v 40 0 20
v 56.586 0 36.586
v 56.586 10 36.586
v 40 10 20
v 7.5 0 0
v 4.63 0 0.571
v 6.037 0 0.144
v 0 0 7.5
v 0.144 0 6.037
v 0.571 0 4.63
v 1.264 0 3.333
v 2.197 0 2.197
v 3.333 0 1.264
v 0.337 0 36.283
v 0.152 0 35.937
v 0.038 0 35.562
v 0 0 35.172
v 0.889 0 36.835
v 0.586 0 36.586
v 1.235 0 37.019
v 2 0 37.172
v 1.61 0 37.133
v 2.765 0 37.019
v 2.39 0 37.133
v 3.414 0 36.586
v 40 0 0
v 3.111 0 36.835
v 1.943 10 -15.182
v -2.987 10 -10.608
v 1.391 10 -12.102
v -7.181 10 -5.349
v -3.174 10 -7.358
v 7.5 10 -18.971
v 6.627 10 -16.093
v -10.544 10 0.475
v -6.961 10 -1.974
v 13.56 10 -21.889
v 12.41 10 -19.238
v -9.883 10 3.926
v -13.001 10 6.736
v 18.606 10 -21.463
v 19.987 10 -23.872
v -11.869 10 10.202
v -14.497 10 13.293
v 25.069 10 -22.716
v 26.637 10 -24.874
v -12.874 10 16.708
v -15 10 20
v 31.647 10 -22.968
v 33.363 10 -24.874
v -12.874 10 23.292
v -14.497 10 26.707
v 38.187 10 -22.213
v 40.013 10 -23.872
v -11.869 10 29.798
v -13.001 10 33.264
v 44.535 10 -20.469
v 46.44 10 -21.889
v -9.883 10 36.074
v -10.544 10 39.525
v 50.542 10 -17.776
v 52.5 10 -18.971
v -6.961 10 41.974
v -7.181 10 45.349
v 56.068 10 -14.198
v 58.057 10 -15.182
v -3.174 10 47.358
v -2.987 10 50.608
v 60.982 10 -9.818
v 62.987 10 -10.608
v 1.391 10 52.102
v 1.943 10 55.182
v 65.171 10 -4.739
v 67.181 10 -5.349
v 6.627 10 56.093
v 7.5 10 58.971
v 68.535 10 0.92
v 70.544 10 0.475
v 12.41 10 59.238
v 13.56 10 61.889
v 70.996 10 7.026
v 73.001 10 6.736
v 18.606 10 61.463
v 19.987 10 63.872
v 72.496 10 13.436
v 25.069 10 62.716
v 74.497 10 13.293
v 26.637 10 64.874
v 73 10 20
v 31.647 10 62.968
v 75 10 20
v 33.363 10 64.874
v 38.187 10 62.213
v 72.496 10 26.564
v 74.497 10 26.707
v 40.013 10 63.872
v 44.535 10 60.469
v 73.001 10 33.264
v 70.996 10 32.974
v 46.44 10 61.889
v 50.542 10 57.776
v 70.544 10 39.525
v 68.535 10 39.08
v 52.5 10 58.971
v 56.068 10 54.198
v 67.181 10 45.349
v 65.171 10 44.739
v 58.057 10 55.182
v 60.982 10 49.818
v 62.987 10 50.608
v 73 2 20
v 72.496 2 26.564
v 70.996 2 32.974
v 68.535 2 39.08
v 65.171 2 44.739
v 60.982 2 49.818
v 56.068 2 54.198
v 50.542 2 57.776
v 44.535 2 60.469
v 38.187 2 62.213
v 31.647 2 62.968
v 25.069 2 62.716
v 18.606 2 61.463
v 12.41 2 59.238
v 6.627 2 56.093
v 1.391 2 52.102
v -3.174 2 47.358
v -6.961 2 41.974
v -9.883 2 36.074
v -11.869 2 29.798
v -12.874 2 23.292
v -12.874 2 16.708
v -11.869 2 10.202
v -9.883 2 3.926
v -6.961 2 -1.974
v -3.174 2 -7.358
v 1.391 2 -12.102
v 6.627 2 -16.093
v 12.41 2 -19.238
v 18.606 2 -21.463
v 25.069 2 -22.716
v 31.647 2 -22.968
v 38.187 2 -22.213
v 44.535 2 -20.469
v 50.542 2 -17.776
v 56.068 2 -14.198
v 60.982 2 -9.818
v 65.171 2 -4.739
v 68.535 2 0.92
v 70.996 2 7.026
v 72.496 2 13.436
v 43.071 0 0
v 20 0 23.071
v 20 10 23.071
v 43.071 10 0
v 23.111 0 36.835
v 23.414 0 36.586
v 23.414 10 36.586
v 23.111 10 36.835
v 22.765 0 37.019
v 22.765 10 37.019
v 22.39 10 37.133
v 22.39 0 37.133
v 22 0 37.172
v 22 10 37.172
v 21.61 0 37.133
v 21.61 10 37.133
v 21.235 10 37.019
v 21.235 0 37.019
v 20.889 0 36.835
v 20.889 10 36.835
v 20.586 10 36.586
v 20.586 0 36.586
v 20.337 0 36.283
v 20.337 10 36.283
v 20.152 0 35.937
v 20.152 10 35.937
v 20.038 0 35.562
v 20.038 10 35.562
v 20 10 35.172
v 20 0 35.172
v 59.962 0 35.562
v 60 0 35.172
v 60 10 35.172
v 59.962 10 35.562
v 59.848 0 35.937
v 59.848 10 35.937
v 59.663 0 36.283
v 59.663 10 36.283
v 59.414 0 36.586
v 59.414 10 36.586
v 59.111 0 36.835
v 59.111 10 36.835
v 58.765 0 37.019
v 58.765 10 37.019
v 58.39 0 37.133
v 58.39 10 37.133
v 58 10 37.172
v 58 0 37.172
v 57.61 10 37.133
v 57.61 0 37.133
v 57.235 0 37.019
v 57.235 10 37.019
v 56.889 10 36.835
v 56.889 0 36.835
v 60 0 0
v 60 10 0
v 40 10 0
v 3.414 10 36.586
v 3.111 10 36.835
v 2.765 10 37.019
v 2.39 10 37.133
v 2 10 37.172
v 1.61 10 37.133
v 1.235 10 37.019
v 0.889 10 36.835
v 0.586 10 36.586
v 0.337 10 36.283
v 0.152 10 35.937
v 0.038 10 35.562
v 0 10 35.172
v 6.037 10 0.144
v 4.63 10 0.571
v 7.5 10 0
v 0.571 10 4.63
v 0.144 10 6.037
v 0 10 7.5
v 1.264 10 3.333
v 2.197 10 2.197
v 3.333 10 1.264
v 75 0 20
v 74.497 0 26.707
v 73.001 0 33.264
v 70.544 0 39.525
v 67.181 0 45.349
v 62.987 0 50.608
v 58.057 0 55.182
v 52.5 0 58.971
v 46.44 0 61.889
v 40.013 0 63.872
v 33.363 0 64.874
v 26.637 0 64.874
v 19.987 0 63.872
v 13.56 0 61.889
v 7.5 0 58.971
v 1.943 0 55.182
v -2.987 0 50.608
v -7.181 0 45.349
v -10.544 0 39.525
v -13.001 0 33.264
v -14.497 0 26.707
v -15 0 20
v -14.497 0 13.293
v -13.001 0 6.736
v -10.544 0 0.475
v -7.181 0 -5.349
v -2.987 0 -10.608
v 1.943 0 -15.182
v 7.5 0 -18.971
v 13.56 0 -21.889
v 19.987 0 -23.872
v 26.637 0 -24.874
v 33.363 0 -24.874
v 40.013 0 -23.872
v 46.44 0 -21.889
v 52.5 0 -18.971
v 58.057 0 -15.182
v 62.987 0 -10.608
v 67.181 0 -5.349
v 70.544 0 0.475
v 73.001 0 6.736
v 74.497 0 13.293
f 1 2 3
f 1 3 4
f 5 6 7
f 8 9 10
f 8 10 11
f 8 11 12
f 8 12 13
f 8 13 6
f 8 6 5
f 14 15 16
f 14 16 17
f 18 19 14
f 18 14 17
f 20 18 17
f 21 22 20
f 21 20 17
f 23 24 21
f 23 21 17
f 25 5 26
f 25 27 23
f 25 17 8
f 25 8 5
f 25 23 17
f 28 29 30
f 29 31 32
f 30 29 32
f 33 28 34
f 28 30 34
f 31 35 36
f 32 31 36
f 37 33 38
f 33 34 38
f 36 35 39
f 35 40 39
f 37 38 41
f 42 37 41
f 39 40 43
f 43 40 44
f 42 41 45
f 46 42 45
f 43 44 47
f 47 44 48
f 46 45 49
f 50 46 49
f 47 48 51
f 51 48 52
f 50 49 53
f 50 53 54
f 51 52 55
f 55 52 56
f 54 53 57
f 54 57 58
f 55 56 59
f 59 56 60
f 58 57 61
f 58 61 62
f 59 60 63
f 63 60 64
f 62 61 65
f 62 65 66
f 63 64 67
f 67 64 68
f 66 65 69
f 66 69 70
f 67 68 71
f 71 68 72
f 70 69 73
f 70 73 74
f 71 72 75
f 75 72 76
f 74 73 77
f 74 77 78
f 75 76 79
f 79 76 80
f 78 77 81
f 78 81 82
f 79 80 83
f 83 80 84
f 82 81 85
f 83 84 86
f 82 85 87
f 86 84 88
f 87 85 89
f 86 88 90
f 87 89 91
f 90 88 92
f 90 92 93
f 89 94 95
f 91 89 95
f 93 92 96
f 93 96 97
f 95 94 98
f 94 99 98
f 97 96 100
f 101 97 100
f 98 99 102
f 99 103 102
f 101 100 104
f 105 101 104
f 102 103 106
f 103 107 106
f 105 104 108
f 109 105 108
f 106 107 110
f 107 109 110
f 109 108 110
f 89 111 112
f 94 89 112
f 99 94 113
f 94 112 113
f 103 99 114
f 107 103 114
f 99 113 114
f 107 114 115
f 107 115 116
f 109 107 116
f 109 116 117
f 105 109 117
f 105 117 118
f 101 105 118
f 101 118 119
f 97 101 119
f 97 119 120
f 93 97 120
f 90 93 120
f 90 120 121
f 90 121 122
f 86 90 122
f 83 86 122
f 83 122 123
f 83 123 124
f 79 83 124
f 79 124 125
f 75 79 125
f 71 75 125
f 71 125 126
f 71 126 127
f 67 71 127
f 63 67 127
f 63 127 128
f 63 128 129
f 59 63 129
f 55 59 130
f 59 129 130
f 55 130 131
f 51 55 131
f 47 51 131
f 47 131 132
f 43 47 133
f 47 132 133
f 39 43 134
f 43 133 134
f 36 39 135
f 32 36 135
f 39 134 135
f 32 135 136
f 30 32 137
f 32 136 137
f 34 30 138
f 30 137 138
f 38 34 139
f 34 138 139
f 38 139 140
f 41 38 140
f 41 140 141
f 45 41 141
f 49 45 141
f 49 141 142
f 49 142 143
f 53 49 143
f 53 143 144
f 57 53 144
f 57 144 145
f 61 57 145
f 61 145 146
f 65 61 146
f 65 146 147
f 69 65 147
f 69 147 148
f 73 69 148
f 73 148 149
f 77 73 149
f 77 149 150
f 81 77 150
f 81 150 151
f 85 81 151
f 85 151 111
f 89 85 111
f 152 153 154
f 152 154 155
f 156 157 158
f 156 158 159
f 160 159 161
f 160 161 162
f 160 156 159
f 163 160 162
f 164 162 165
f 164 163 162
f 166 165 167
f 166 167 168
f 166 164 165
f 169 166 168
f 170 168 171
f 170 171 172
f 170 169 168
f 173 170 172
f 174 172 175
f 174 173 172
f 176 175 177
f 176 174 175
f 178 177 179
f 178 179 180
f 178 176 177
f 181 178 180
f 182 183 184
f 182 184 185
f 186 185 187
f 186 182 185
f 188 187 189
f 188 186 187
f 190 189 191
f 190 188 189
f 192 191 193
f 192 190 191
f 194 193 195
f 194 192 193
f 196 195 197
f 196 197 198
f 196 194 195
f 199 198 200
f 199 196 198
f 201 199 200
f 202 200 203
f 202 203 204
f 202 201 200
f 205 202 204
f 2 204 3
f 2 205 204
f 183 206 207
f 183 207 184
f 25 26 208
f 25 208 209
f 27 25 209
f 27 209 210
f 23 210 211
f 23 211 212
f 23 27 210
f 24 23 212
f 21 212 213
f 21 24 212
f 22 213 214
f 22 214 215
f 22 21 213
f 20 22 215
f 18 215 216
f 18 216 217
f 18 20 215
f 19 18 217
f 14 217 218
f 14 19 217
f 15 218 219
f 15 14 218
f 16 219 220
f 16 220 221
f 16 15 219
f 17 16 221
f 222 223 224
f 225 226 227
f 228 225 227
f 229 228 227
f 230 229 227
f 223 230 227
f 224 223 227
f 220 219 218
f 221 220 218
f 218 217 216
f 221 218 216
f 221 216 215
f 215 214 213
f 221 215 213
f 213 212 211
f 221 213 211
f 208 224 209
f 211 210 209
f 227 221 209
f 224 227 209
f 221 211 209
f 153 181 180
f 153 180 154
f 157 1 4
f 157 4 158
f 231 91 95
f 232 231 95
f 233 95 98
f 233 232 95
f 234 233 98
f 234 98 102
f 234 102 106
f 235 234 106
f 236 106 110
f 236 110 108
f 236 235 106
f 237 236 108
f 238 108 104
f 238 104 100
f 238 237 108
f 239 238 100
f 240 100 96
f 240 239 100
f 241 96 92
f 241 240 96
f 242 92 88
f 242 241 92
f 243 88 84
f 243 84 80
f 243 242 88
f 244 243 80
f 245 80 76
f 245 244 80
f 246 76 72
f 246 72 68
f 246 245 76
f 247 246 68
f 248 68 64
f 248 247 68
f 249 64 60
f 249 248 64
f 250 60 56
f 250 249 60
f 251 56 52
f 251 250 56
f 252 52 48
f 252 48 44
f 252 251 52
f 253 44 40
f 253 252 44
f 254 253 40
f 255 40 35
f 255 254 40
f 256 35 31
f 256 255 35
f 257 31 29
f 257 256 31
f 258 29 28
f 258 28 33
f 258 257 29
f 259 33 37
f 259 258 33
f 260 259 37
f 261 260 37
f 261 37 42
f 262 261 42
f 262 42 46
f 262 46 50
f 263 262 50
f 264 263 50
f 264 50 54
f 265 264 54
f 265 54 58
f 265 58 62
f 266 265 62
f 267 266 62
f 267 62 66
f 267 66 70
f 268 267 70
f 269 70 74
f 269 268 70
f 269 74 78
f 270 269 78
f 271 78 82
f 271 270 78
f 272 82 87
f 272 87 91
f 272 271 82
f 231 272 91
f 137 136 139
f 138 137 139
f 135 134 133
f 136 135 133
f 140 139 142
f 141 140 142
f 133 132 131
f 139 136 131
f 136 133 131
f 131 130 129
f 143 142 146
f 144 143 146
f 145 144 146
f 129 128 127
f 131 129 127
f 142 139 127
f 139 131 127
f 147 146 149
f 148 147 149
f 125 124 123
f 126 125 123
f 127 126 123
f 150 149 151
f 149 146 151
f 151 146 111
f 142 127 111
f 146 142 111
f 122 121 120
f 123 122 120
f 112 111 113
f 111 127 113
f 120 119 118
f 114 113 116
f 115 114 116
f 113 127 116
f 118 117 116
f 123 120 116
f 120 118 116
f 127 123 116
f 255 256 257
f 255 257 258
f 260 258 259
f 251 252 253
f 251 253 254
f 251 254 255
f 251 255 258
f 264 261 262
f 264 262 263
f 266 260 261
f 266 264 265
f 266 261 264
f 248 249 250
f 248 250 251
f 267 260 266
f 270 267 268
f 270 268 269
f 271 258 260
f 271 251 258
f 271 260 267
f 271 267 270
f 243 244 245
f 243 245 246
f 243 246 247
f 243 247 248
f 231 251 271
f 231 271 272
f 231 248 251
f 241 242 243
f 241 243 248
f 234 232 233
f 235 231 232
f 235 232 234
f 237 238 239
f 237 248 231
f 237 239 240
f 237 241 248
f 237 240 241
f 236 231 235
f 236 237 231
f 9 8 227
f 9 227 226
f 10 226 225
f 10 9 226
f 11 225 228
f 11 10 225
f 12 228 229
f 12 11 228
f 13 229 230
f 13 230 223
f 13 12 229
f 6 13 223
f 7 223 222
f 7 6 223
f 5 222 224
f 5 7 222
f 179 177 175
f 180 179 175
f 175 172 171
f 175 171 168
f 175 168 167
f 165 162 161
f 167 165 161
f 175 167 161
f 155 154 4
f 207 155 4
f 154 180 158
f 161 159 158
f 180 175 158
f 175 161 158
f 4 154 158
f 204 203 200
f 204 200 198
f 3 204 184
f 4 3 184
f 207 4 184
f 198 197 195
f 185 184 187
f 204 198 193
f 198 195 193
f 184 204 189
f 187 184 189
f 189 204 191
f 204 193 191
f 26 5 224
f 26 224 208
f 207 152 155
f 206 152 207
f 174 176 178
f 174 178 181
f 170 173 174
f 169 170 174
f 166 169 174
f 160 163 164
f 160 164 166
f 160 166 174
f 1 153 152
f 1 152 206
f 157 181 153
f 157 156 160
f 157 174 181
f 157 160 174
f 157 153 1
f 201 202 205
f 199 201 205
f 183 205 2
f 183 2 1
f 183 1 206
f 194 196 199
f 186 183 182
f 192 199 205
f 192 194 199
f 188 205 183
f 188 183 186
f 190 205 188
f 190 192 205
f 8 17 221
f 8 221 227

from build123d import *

# Parameters (mm, degrees)
F1_DEPTH = 10
F2_R     = 45
F3_DEPTH = 10
F4_T     = -2


with BuildPart() as f1:
    # F0 (on Front) → F1 (new body)
    with BuildSketch(Plane.XZ):
        with BuildLine():
            ThreePointArc((0, 7.5), (2.1966991411, 2.1966991411), (7.5, 0))
            Line((7.5, 0), (20, 0))
            Line((20, 0), (40, 0))
            Line((40, 0), (20, 20))
            Line((20, 20), (3.4142135624, 36.5857864376))
            ThreePointArc((3.4142135624, 36.5857864376), (1.2346331353, 37.0193319403), (0, 35.1715728753))
            Line((0, 35.1715728753), (0, 20))
            Line((0, 20), (0, 7.5))
        make_face()
    extrude(amount=-F1_DEPTH)


with BuildPart() as f1b:
    # F0 (on Front) → F1, piece 2 (new body)
    with BuildSketch(Plane.XZ):
        with BuildLine():
            Line((20, 35.1715728753), (20, 23.0705063045))
            Line((20, 23.0705063045), (43.0705063045, 0))
            Line((43.0705063045, 0), (60, 0))
            Line((60, 0), (60, 35.1715728753))
            ThreePointArc((60, 35.1715728753), (58.7653668647, 37.0193319403), (56.5857864376, 36.5857864376))
            Line((56.5857864376, 36.5857864376), (40, 20))
            Line((40, 20), (23.4142135624, 36.5857864376))
            ThreePointArc((23.4142135624, 36.5857864376), (21.2346331353, 37.0193319403), (20, 35.1715728753))
        make_face()
    extrude(amount=-F1_DEPTH)


with BuildPart() as f3:
    # F2 (on face) → F3 (new body, through all)
    with BuildSketch(Plane.XZ):
        with Locations((30, 20)):
            Circle(F2_R)
    extrude(amount=-F3_DEPTH)

    # F4
    f4_openings = [f3.faces().sort_by_distance(p)[0] for p in [
        (30, 10, 20),
    ]]
    offset(amount=F4_T, openings=f4_openings)


solid = Compound([f1.part, f1b.part, f3.part])
